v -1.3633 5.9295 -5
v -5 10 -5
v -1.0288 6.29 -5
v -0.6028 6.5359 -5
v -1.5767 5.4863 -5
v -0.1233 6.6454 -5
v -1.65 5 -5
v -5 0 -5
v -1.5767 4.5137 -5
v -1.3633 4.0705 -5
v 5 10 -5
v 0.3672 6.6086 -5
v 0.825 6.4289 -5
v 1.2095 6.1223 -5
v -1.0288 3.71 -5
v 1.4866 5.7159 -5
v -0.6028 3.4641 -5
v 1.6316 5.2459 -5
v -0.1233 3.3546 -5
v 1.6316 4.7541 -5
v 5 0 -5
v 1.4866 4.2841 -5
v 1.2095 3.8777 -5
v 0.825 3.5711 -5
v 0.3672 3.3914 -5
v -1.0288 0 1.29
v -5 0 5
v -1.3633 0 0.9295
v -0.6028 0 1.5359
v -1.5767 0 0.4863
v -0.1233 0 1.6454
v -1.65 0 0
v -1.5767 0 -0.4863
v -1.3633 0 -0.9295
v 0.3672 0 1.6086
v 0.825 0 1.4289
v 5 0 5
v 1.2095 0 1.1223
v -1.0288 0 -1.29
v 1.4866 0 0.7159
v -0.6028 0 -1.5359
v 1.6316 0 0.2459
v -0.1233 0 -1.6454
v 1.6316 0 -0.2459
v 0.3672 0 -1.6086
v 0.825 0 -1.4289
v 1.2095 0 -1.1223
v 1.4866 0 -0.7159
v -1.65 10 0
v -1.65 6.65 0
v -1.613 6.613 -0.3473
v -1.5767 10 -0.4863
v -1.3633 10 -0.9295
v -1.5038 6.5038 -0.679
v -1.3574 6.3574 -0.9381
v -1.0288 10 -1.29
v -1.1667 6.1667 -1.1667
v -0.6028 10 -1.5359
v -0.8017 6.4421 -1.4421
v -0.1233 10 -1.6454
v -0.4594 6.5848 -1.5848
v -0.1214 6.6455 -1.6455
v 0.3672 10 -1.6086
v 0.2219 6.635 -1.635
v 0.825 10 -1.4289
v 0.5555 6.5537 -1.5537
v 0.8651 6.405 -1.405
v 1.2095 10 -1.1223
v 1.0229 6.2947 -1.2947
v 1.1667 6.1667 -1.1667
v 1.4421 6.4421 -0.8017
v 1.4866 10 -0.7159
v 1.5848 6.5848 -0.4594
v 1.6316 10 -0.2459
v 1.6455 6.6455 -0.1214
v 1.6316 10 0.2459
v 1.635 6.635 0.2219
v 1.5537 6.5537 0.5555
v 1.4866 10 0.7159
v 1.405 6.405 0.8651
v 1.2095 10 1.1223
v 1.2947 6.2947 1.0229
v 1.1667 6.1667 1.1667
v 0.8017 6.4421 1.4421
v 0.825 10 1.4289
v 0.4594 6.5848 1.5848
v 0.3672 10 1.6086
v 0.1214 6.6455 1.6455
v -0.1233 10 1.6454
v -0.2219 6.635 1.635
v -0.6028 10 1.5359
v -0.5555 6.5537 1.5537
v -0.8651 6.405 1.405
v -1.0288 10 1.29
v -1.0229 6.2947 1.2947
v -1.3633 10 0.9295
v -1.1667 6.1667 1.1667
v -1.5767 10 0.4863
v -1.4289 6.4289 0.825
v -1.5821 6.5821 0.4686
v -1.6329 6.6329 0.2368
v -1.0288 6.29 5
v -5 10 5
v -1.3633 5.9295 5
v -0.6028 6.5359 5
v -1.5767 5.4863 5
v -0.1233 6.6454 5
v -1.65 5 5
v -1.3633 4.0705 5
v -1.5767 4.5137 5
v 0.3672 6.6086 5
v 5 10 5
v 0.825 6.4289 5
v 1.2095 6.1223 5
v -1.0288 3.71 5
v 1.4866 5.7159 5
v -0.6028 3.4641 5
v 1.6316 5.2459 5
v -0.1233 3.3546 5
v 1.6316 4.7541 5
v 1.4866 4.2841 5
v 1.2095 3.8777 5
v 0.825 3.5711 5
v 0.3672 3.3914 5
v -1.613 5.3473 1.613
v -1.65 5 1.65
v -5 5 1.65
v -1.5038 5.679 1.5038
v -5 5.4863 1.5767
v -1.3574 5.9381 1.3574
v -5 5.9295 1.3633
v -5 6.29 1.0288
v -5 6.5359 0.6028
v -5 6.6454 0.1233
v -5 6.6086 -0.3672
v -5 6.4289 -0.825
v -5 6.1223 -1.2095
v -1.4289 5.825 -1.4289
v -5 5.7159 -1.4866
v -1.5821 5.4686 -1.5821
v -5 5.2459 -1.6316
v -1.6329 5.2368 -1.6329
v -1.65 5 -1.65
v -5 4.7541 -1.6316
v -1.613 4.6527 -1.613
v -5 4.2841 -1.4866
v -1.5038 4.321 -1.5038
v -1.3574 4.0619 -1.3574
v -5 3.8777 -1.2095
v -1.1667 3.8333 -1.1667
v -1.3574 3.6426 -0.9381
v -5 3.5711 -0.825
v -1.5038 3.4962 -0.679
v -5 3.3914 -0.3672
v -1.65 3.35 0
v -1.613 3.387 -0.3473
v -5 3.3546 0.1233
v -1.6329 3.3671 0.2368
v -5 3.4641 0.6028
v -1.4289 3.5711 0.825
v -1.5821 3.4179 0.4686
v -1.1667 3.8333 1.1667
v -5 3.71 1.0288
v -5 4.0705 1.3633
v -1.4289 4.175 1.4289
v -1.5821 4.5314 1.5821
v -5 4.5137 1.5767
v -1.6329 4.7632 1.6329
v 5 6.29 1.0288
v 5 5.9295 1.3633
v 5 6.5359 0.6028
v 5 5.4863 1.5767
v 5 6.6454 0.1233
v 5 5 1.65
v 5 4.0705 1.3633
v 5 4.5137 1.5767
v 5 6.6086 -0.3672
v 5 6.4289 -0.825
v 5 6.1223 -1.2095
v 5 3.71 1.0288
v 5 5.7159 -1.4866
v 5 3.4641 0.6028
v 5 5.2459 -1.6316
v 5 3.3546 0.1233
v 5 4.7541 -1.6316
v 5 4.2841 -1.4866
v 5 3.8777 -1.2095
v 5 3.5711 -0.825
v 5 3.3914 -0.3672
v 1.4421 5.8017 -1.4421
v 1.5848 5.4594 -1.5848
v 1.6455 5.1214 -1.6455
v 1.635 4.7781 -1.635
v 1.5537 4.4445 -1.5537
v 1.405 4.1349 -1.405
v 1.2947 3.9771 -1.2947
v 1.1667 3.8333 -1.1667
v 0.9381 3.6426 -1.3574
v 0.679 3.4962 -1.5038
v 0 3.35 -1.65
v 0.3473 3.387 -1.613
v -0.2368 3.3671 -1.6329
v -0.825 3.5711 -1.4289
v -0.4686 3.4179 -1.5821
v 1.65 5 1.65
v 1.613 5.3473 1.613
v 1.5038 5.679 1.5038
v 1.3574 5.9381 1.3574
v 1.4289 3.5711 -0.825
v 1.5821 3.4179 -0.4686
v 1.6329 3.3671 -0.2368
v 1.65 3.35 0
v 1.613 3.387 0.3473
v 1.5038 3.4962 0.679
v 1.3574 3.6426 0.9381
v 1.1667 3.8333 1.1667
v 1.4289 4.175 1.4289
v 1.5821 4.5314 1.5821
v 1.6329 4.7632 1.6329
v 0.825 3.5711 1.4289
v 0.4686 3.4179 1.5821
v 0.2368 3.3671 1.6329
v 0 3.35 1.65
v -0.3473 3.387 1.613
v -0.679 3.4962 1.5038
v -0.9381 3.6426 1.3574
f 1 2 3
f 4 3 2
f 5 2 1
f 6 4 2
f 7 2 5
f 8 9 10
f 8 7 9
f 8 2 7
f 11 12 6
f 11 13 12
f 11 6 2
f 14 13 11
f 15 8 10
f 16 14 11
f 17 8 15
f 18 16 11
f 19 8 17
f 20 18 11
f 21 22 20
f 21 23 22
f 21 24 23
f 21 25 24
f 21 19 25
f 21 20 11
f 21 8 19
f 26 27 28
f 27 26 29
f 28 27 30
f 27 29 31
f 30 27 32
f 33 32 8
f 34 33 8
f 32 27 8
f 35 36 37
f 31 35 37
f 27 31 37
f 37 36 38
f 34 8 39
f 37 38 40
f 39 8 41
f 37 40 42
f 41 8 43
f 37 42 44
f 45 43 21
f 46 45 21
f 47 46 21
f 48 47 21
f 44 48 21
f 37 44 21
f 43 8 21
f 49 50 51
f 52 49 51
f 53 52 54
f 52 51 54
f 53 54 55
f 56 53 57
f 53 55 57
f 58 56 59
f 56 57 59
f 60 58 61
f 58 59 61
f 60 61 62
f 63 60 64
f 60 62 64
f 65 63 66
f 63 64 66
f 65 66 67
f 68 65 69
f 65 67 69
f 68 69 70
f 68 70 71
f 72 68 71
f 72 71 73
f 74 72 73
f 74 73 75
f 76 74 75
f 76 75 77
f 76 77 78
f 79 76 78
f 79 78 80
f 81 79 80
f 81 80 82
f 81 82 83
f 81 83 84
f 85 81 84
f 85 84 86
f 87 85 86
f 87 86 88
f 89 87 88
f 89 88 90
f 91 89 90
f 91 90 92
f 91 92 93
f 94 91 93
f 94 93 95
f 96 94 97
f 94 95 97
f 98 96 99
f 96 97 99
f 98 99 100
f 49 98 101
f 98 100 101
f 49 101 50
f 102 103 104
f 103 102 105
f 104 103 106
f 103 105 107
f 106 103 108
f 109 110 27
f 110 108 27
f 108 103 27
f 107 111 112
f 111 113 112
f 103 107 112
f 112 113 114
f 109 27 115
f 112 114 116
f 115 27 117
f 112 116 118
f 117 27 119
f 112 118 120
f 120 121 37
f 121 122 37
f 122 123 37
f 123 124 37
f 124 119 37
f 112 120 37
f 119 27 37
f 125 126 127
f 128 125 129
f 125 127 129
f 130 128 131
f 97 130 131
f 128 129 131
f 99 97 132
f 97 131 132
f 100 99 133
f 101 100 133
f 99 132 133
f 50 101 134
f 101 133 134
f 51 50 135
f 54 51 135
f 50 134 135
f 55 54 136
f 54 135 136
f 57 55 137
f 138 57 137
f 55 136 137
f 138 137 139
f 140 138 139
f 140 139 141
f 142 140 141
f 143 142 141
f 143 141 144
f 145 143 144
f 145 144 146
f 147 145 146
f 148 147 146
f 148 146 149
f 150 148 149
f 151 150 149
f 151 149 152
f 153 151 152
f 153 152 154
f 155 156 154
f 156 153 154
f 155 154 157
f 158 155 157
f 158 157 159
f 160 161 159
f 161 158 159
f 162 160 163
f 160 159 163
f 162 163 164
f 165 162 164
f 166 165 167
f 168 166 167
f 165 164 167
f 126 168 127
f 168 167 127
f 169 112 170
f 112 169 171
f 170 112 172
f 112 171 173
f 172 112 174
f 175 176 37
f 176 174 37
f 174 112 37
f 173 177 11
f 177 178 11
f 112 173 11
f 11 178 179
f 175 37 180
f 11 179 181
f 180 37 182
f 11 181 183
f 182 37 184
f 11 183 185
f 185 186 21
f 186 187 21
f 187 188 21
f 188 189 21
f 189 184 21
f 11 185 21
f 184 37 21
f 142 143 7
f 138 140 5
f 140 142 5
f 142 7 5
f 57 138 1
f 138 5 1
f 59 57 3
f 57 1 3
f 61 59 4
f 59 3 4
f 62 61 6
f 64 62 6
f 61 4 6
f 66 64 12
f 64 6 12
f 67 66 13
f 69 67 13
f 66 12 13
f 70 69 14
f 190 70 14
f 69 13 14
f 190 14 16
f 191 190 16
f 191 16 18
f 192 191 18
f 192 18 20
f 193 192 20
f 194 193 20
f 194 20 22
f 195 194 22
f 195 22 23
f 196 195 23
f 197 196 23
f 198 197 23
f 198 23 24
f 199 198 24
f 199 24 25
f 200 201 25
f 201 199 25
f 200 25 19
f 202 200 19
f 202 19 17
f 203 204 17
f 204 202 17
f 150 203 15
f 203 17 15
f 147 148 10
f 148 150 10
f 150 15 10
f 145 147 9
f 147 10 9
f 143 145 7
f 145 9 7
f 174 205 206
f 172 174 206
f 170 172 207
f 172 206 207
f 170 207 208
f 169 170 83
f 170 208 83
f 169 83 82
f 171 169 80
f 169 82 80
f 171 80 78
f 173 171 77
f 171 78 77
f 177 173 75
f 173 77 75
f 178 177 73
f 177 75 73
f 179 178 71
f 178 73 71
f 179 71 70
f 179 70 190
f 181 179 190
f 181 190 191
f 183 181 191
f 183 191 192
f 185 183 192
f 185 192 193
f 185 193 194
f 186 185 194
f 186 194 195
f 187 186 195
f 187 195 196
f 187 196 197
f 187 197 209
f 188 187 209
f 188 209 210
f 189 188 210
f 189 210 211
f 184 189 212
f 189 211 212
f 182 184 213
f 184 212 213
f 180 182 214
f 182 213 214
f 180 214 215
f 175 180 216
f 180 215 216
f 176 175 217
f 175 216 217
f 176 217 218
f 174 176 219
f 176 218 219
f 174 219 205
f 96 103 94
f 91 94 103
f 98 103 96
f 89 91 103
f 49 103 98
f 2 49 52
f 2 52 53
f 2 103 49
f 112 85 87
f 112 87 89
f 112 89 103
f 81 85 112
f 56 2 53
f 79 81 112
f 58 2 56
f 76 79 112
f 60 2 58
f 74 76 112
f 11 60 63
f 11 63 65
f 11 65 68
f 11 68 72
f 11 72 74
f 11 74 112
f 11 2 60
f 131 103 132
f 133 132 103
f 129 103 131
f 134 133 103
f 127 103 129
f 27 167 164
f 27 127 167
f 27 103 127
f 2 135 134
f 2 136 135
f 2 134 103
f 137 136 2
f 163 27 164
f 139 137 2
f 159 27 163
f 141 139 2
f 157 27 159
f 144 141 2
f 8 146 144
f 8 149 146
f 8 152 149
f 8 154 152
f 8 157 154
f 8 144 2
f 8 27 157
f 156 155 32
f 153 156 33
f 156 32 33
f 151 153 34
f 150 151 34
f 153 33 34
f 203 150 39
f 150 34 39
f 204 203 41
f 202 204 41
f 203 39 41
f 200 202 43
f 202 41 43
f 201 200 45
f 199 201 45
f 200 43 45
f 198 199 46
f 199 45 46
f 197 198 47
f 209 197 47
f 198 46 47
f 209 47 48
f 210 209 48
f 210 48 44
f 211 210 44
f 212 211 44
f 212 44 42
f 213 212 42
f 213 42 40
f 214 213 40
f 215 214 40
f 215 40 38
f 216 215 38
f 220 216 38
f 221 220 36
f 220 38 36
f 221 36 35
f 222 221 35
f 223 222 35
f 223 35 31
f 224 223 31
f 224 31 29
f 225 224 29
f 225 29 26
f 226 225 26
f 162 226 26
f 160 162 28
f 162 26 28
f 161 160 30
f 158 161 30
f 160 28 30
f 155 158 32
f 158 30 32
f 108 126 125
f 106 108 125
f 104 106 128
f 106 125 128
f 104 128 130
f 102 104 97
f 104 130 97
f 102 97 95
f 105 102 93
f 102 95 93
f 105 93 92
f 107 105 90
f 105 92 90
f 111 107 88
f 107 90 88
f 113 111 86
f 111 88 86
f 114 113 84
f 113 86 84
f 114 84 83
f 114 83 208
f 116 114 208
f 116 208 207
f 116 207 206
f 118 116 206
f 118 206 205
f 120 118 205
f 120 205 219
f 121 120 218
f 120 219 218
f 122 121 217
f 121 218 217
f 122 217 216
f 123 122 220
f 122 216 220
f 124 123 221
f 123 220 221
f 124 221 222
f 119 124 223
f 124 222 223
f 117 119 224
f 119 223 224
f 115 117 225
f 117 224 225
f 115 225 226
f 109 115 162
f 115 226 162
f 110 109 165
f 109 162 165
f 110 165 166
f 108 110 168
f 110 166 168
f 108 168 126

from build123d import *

# Parameters (mm, degrees)
SKETCH_1_W      = 10
SKETCH_1_H      = 10
EXTRUDE_1_DEPTH = 10
HOLE_WIZARD_1_D = 3.3
HOLE_WIZARD_2_D = 3.3
HOLE_WIZARD_3_D = 3.3


with BuildPart() as part:
    # 草图1 → 凸台-拉伸1 (new body)
    with BuildSketch(Plane(origin=(0, 0, 0), x_dir=(1, 0, 0), z_dir=(0, 1, 0))):
        Rectangle(SKETCH_1_W, SKETCH_1_H)
    extrude(amount=EXTRUDE_1_DEPTH)

    # 孔1 (through all)
    with Locations(Plane(origin=(0, 10, 0), x_dir=(1, 0, 0), z_dir=(0, 1, 0))):
        with Locations((0, 0)):
            Hole(HOLE_WIZARD_1_D / 2)

    # 孔2 (through all)
    with Locations(Plane(origin=(5, 0, 0), x_dir=(0, 0, -1), z_dir=(1, 0, 0))):
        with Locations((0, 5)):
            Hole(HOLE_WIZARD_2_D / 2)

    # 孔3 (through all)
    with Locations(Plane.XY.offset(5)):
        with Locations((0, 5)):
            Hole(HOLE_WIZARD_3_D / 2)


solid = part.part
